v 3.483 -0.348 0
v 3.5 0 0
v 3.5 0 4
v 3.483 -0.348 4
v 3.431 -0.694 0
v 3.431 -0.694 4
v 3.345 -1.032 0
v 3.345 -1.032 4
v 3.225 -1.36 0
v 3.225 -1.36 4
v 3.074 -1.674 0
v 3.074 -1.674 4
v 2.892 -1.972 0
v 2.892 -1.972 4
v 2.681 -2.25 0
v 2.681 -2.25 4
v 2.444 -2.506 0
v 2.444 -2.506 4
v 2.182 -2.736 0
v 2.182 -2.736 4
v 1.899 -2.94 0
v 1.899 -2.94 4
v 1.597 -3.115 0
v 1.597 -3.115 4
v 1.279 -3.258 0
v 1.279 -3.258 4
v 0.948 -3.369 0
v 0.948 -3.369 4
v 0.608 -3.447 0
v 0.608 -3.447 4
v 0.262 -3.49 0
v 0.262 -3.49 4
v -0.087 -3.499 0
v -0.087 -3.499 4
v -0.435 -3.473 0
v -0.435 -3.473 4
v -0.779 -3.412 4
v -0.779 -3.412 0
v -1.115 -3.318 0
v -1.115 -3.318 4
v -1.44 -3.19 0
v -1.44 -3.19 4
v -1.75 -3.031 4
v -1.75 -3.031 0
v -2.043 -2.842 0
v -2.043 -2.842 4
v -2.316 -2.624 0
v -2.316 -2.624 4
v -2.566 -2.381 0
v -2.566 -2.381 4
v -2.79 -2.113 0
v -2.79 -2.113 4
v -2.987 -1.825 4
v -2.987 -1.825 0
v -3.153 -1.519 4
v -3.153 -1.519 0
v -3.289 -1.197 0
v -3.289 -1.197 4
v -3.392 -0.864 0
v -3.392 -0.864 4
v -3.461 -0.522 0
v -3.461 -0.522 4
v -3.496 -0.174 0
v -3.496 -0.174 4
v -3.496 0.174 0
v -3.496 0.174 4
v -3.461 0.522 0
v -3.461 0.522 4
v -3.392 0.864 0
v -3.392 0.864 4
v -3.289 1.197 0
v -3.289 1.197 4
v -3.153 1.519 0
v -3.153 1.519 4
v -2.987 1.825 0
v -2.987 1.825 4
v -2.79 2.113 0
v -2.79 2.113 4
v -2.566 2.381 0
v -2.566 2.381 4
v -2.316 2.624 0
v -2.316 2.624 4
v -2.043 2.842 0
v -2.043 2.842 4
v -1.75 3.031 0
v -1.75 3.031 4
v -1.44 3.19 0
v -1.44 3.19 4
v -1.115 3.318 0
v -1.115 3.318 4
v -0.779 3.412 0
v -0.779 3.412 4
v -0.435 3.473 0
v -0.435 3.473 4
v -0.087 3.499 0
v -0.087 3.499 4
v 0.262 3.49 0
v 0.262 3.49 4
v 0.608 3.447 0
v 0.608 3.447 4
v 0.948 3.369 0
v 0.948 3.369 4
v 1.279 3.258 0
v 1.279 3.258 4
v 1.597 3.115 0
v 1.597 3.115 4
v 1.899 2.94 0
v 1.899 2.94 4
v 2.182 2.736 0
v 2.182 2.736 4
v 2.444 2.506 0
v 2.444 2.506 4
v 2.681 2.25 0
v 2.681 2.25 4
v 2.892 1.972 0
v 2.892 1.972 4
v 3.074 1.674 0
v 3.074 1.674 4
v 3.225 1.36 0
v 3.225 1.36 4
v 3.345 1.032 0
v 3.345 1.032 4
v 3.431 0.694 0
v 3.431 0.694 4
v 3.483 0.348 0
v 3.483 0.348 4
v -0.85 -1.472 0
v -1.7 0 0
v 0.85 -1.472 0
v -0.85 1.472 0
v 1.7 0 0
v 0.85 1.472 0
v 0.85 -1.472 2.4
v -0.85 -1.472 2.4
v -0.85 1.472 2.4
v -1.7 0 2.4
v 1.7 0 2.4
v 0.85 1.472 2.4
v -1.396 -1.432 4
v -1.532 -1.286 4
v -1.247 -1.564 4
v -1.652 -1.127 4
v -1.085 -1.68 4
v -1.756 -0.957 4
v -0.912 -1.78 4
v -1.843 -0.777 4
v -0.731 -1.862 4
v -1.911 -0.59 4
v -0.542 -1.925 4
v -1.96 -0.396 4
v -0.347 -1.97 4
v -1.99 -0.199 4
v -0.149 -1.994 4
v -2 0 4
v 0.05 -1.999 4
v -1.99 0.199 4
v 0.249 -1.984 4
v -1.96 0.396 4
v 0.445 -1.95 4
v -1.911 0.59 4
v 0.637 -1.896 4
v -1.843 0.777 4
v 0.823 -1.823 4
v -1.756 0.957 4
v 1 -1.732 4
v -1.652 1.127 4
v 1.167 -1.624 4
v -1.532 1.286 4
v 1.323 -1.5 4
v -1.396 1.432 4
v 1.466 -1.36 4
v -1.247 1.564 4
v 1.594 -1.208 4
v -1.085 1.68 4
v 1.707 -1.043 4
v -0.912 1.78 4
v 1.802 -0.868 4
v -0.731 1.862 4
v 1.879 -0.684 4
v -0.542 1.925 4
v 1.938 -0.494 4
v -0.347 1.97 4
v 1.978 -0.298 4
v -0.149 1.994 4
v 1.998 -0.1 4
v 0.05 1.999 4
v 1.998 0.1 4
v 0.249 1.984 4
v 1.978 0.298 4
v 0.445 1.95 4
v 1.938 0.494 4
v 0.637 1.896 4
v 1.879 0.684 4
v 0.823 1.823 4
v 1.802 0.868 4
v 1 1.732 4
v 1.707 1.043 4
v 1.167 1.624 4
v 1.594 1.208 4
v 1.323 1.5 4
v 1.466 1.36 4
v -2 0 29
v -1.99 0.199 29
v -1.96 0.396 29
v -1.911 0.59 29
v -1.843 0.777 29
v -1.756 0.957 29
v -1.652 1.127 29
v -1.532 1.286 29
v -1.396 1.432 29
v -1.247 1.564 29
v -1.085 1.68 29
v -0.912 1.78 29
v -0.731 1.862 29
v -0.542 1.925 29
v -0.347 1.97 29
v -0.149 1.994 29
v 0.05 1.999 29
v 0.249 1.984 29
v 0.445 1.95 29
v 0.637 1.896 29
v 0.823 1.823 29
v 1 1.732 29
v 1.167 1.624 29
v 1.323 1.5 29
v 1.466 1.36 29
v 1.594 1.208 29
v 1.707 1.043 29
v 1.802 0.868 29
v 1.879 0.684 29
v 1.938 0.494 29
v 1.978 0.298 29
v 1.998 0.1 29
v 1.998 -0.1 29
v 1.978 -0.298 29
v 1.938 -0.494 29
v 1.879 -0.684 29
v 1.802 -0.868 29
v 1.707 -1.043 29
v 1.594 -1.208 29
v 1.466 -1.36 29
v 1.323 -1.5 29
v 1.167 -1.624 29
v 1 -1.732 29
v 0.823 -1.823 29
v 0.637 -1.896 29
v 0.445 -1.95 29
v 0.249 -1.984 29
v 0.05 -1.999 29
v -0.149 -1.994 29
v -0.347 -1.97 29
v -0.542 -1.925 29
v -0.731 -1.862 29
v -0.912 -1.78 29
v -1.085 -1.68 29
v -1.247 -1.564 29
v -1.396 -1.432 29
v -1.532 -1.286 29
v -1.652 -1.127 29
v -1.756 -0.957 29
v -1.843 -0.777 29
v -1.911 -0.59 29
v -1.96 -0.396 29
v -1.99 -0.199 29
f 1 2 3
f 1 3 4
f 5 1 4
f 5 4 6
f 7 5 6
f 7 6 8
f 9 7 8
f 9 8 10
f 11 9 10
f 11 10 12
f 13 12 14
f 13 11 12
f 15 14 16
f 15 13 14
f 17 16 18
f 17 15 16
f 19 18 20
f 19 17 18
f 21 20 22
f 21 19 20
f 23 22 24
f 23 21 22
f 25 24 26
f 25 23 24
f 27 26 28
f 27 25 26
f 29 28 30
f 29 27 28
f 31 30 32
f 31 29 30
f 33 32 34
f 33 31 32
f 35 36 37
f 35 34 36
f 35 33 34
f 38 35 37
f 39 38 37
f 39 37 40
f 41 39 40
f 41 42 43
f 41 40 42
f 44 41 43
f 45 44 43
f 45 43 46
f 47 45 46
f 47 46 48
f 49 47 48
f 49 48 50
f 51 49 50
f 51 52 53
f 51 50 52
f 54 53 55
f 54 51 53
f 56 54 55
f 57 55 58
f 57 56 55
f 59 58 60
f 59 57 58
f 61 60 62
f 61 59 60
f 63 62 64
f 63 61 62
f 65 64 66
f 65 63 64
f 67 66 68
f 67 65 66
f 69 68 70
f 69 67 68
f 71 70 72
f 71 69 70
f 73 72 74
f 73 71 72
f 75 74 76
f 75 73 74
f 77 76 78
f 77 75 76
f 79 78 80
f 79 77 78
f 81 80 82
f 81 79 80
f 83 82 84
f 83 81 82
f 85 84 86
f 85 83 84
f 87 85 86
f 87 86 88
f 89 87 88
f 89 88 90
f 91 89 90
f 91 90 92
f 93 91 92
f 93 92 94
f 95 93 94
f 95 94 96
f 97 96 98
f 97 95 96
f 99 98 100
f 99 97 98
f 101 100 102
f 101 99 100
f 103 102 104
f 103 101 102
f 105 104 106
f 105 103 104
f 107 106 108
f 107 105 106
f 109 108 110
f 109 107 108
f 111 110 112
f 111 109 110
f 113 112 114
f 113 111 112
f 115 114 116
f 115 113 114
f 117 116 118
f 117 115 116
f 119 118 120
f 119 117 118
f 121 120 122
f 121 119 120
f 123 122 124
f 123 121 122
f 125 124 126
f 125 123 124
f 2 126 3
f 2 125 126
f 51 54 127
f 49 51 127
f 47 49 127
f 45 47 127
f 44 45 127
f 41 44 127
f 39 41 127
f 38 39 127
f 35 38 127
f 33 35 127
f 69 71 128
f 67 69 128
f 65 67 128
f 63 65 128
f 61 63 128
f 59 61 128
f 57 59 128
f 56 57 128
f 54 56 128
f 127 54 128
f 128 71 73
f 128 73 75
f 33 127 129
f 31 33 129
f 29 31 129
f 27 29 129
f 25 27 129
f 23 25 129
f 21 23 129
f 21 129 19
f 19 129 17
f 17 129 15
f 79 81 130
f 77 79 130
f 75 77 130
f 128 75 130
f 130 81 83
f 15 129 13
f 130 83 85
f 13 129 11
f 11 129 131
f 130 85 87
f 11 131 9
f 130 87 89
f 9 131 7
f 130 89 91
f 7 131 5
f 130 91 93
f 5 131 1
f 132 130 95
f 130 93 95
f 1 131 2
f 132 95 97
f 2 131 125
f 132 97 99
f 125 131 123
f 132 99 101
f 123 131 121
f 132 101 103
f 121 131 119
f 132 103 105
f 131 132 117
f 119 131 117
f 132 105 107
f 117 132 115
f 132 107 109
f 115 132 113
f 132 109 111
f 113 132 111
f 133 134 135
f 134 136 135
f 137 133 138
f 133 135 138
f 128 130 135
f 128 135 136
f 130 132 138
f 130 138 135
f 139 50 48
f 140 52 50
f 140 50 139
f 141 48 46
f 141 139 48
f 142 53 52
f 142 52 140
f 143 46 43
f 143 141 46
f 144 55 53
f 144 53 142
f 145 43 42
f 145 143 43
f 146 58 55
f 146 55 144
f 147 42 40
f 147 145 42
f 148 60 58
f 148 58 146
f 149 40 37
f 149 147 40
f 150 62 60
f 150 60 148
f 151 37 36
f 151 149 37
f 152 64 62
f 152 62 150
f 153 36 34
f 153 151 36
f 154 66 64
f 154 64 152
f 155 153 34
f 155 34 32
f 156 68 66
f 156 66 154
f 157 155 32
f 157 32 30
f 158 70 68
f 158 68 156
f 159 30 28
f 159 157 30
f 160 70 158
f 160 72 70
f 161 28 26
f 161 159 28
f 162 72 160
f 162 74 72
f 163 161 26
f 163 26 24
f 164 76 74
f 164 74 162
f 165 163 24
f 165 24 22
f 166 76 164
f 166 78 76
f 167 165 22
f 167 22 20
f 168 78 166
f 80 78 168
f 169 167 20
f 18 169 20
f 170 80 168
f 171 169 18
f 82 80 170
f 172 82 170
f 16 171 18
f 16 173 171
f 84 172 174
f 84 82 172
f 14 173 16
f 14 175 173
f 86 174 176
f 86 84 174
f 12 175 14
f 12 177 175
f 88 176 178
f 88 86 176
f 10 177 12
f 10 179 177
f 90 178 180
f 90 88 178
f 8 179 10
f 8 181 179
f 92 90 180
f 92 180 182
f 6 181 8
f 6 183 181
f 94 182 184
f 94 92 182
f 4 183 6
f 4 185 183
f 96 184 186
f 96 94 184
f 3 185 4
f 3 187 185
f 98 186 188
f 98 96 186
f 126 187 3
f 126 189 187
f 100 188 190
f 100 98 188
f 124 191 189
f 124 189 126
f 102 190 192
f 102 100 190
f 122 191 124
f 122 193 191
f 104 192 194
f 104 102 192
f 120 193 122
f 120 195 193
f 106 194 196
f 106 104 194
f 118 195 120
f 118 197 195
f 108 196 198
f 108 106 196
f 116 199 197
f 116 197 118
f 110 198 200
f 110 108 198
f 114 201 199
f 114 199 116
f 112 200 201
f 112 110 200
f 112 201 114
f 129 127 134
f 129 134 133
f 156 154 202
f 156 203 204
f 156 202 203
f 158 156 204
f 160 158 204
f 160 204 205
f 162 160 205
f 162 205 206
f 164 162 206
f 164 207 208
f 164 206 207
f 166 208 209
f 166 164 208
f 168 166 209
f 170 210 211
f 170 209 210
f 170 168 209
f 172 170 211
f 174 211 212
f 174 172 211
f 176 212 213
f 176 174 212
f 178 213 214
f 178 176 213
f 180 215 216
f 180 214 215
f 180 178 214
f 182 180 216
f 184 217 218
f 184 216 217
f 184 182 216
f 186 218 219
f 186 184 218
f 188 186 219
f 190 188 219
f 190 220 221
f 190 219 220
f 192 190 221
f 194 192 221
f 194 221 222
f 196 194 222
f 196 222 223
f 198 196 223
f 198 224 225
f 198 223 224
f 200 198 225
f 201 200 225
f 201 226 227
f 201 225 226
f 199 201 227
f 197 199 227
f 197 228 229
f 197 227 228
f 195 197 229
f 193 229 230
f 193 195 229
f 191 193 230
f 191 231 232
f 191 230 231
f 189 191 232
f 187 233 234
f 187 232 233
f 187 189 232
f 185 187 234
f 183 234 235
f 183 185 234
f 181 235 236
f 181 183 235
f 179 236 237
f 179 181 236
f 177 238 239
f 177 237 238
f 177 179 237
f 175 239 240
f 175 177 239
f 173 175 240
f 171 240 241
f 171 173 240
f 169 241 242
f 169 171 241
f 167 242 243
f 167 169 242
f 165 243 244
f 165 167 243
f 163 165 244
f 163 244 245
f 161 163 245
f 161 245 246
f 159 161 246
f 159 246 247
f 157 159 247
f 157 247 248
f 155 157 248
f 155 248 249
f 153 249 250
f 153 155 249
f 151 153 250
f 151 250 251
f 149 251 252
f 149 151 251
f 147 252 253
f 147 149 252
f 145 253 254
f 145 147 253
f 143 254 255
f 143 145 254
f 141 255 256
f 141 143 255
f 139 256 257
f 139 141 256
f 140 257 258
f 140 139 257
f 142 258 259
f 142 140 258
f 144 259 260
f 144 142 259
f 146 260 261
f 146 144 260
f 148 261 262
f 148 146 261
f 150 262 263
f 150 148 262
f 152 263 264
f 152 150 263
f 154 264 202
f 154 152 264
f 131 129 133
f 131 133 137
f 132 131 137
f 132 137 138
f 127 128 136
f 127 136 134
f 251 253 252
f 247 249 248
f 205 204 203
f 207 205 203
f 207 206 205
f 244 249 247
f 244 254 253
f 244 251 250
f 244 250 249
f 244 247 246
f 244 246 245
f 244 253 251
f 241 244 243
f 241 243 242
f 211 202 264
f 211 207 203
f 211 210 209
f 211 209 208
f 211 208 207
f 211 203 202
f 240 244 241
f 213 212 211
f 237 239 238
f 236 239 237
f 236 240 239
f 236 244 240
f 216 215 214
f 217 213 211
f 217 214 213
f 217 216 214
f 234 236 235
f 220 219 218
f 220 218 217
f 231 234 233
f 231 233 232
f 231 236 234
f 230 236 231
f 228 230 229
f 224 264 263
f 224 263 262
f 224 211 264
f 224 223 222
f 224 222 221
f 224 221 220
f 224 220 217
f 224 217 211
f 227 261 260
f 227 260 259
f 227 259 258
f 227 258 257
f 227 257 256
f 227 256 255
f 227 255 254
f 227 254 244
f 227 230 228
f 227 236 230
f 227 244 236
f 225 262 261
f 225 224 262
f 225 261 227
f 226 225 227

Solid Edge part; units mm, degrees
sketch "Sketch1" plane through (0, 0, 0) normal (0, 0, 1) x (1, 0, 0)
  circle A0 centre (0, 0) radius 3.5
extrude "Protrusion1" add sketch "Sketch1" along normal blind 4
sketch "Sketch2" plane through (0, 0, 0) normal (0, 0, -1) x (1, 0, 0)
  line L0 (0.85, 1.4722) -> (1.7, 0)
  line L1 (1.7, 0) -> (0.85, -1.4722)
  line L2 (0.85, -1.4722) -> (-0.85, -1.4722)
  line L3 (-0.85, -1.4722) -> (-1.7, 0)
  line L4 (-1.7, 0) -> (-0.85, 1.4722)
  line L5 (-0.85, 1.4722) -> (0.85, 1.4722)
extrude "ExtrudedCutout_1" cut sketch "Sketch2" against normal blind 2.4
sketch "Sketch3" plane through (0, 0, 4) normal (0, 0, 1) x (-1, 0, 0)
  circle A0 centre (0, 0) radius 2
extrude "ExtrudedProtrusion_2" add sketch "Sketch3" along normal blind 25
cosmetic_thread "Thread_1" size "M4" thread depth 20
